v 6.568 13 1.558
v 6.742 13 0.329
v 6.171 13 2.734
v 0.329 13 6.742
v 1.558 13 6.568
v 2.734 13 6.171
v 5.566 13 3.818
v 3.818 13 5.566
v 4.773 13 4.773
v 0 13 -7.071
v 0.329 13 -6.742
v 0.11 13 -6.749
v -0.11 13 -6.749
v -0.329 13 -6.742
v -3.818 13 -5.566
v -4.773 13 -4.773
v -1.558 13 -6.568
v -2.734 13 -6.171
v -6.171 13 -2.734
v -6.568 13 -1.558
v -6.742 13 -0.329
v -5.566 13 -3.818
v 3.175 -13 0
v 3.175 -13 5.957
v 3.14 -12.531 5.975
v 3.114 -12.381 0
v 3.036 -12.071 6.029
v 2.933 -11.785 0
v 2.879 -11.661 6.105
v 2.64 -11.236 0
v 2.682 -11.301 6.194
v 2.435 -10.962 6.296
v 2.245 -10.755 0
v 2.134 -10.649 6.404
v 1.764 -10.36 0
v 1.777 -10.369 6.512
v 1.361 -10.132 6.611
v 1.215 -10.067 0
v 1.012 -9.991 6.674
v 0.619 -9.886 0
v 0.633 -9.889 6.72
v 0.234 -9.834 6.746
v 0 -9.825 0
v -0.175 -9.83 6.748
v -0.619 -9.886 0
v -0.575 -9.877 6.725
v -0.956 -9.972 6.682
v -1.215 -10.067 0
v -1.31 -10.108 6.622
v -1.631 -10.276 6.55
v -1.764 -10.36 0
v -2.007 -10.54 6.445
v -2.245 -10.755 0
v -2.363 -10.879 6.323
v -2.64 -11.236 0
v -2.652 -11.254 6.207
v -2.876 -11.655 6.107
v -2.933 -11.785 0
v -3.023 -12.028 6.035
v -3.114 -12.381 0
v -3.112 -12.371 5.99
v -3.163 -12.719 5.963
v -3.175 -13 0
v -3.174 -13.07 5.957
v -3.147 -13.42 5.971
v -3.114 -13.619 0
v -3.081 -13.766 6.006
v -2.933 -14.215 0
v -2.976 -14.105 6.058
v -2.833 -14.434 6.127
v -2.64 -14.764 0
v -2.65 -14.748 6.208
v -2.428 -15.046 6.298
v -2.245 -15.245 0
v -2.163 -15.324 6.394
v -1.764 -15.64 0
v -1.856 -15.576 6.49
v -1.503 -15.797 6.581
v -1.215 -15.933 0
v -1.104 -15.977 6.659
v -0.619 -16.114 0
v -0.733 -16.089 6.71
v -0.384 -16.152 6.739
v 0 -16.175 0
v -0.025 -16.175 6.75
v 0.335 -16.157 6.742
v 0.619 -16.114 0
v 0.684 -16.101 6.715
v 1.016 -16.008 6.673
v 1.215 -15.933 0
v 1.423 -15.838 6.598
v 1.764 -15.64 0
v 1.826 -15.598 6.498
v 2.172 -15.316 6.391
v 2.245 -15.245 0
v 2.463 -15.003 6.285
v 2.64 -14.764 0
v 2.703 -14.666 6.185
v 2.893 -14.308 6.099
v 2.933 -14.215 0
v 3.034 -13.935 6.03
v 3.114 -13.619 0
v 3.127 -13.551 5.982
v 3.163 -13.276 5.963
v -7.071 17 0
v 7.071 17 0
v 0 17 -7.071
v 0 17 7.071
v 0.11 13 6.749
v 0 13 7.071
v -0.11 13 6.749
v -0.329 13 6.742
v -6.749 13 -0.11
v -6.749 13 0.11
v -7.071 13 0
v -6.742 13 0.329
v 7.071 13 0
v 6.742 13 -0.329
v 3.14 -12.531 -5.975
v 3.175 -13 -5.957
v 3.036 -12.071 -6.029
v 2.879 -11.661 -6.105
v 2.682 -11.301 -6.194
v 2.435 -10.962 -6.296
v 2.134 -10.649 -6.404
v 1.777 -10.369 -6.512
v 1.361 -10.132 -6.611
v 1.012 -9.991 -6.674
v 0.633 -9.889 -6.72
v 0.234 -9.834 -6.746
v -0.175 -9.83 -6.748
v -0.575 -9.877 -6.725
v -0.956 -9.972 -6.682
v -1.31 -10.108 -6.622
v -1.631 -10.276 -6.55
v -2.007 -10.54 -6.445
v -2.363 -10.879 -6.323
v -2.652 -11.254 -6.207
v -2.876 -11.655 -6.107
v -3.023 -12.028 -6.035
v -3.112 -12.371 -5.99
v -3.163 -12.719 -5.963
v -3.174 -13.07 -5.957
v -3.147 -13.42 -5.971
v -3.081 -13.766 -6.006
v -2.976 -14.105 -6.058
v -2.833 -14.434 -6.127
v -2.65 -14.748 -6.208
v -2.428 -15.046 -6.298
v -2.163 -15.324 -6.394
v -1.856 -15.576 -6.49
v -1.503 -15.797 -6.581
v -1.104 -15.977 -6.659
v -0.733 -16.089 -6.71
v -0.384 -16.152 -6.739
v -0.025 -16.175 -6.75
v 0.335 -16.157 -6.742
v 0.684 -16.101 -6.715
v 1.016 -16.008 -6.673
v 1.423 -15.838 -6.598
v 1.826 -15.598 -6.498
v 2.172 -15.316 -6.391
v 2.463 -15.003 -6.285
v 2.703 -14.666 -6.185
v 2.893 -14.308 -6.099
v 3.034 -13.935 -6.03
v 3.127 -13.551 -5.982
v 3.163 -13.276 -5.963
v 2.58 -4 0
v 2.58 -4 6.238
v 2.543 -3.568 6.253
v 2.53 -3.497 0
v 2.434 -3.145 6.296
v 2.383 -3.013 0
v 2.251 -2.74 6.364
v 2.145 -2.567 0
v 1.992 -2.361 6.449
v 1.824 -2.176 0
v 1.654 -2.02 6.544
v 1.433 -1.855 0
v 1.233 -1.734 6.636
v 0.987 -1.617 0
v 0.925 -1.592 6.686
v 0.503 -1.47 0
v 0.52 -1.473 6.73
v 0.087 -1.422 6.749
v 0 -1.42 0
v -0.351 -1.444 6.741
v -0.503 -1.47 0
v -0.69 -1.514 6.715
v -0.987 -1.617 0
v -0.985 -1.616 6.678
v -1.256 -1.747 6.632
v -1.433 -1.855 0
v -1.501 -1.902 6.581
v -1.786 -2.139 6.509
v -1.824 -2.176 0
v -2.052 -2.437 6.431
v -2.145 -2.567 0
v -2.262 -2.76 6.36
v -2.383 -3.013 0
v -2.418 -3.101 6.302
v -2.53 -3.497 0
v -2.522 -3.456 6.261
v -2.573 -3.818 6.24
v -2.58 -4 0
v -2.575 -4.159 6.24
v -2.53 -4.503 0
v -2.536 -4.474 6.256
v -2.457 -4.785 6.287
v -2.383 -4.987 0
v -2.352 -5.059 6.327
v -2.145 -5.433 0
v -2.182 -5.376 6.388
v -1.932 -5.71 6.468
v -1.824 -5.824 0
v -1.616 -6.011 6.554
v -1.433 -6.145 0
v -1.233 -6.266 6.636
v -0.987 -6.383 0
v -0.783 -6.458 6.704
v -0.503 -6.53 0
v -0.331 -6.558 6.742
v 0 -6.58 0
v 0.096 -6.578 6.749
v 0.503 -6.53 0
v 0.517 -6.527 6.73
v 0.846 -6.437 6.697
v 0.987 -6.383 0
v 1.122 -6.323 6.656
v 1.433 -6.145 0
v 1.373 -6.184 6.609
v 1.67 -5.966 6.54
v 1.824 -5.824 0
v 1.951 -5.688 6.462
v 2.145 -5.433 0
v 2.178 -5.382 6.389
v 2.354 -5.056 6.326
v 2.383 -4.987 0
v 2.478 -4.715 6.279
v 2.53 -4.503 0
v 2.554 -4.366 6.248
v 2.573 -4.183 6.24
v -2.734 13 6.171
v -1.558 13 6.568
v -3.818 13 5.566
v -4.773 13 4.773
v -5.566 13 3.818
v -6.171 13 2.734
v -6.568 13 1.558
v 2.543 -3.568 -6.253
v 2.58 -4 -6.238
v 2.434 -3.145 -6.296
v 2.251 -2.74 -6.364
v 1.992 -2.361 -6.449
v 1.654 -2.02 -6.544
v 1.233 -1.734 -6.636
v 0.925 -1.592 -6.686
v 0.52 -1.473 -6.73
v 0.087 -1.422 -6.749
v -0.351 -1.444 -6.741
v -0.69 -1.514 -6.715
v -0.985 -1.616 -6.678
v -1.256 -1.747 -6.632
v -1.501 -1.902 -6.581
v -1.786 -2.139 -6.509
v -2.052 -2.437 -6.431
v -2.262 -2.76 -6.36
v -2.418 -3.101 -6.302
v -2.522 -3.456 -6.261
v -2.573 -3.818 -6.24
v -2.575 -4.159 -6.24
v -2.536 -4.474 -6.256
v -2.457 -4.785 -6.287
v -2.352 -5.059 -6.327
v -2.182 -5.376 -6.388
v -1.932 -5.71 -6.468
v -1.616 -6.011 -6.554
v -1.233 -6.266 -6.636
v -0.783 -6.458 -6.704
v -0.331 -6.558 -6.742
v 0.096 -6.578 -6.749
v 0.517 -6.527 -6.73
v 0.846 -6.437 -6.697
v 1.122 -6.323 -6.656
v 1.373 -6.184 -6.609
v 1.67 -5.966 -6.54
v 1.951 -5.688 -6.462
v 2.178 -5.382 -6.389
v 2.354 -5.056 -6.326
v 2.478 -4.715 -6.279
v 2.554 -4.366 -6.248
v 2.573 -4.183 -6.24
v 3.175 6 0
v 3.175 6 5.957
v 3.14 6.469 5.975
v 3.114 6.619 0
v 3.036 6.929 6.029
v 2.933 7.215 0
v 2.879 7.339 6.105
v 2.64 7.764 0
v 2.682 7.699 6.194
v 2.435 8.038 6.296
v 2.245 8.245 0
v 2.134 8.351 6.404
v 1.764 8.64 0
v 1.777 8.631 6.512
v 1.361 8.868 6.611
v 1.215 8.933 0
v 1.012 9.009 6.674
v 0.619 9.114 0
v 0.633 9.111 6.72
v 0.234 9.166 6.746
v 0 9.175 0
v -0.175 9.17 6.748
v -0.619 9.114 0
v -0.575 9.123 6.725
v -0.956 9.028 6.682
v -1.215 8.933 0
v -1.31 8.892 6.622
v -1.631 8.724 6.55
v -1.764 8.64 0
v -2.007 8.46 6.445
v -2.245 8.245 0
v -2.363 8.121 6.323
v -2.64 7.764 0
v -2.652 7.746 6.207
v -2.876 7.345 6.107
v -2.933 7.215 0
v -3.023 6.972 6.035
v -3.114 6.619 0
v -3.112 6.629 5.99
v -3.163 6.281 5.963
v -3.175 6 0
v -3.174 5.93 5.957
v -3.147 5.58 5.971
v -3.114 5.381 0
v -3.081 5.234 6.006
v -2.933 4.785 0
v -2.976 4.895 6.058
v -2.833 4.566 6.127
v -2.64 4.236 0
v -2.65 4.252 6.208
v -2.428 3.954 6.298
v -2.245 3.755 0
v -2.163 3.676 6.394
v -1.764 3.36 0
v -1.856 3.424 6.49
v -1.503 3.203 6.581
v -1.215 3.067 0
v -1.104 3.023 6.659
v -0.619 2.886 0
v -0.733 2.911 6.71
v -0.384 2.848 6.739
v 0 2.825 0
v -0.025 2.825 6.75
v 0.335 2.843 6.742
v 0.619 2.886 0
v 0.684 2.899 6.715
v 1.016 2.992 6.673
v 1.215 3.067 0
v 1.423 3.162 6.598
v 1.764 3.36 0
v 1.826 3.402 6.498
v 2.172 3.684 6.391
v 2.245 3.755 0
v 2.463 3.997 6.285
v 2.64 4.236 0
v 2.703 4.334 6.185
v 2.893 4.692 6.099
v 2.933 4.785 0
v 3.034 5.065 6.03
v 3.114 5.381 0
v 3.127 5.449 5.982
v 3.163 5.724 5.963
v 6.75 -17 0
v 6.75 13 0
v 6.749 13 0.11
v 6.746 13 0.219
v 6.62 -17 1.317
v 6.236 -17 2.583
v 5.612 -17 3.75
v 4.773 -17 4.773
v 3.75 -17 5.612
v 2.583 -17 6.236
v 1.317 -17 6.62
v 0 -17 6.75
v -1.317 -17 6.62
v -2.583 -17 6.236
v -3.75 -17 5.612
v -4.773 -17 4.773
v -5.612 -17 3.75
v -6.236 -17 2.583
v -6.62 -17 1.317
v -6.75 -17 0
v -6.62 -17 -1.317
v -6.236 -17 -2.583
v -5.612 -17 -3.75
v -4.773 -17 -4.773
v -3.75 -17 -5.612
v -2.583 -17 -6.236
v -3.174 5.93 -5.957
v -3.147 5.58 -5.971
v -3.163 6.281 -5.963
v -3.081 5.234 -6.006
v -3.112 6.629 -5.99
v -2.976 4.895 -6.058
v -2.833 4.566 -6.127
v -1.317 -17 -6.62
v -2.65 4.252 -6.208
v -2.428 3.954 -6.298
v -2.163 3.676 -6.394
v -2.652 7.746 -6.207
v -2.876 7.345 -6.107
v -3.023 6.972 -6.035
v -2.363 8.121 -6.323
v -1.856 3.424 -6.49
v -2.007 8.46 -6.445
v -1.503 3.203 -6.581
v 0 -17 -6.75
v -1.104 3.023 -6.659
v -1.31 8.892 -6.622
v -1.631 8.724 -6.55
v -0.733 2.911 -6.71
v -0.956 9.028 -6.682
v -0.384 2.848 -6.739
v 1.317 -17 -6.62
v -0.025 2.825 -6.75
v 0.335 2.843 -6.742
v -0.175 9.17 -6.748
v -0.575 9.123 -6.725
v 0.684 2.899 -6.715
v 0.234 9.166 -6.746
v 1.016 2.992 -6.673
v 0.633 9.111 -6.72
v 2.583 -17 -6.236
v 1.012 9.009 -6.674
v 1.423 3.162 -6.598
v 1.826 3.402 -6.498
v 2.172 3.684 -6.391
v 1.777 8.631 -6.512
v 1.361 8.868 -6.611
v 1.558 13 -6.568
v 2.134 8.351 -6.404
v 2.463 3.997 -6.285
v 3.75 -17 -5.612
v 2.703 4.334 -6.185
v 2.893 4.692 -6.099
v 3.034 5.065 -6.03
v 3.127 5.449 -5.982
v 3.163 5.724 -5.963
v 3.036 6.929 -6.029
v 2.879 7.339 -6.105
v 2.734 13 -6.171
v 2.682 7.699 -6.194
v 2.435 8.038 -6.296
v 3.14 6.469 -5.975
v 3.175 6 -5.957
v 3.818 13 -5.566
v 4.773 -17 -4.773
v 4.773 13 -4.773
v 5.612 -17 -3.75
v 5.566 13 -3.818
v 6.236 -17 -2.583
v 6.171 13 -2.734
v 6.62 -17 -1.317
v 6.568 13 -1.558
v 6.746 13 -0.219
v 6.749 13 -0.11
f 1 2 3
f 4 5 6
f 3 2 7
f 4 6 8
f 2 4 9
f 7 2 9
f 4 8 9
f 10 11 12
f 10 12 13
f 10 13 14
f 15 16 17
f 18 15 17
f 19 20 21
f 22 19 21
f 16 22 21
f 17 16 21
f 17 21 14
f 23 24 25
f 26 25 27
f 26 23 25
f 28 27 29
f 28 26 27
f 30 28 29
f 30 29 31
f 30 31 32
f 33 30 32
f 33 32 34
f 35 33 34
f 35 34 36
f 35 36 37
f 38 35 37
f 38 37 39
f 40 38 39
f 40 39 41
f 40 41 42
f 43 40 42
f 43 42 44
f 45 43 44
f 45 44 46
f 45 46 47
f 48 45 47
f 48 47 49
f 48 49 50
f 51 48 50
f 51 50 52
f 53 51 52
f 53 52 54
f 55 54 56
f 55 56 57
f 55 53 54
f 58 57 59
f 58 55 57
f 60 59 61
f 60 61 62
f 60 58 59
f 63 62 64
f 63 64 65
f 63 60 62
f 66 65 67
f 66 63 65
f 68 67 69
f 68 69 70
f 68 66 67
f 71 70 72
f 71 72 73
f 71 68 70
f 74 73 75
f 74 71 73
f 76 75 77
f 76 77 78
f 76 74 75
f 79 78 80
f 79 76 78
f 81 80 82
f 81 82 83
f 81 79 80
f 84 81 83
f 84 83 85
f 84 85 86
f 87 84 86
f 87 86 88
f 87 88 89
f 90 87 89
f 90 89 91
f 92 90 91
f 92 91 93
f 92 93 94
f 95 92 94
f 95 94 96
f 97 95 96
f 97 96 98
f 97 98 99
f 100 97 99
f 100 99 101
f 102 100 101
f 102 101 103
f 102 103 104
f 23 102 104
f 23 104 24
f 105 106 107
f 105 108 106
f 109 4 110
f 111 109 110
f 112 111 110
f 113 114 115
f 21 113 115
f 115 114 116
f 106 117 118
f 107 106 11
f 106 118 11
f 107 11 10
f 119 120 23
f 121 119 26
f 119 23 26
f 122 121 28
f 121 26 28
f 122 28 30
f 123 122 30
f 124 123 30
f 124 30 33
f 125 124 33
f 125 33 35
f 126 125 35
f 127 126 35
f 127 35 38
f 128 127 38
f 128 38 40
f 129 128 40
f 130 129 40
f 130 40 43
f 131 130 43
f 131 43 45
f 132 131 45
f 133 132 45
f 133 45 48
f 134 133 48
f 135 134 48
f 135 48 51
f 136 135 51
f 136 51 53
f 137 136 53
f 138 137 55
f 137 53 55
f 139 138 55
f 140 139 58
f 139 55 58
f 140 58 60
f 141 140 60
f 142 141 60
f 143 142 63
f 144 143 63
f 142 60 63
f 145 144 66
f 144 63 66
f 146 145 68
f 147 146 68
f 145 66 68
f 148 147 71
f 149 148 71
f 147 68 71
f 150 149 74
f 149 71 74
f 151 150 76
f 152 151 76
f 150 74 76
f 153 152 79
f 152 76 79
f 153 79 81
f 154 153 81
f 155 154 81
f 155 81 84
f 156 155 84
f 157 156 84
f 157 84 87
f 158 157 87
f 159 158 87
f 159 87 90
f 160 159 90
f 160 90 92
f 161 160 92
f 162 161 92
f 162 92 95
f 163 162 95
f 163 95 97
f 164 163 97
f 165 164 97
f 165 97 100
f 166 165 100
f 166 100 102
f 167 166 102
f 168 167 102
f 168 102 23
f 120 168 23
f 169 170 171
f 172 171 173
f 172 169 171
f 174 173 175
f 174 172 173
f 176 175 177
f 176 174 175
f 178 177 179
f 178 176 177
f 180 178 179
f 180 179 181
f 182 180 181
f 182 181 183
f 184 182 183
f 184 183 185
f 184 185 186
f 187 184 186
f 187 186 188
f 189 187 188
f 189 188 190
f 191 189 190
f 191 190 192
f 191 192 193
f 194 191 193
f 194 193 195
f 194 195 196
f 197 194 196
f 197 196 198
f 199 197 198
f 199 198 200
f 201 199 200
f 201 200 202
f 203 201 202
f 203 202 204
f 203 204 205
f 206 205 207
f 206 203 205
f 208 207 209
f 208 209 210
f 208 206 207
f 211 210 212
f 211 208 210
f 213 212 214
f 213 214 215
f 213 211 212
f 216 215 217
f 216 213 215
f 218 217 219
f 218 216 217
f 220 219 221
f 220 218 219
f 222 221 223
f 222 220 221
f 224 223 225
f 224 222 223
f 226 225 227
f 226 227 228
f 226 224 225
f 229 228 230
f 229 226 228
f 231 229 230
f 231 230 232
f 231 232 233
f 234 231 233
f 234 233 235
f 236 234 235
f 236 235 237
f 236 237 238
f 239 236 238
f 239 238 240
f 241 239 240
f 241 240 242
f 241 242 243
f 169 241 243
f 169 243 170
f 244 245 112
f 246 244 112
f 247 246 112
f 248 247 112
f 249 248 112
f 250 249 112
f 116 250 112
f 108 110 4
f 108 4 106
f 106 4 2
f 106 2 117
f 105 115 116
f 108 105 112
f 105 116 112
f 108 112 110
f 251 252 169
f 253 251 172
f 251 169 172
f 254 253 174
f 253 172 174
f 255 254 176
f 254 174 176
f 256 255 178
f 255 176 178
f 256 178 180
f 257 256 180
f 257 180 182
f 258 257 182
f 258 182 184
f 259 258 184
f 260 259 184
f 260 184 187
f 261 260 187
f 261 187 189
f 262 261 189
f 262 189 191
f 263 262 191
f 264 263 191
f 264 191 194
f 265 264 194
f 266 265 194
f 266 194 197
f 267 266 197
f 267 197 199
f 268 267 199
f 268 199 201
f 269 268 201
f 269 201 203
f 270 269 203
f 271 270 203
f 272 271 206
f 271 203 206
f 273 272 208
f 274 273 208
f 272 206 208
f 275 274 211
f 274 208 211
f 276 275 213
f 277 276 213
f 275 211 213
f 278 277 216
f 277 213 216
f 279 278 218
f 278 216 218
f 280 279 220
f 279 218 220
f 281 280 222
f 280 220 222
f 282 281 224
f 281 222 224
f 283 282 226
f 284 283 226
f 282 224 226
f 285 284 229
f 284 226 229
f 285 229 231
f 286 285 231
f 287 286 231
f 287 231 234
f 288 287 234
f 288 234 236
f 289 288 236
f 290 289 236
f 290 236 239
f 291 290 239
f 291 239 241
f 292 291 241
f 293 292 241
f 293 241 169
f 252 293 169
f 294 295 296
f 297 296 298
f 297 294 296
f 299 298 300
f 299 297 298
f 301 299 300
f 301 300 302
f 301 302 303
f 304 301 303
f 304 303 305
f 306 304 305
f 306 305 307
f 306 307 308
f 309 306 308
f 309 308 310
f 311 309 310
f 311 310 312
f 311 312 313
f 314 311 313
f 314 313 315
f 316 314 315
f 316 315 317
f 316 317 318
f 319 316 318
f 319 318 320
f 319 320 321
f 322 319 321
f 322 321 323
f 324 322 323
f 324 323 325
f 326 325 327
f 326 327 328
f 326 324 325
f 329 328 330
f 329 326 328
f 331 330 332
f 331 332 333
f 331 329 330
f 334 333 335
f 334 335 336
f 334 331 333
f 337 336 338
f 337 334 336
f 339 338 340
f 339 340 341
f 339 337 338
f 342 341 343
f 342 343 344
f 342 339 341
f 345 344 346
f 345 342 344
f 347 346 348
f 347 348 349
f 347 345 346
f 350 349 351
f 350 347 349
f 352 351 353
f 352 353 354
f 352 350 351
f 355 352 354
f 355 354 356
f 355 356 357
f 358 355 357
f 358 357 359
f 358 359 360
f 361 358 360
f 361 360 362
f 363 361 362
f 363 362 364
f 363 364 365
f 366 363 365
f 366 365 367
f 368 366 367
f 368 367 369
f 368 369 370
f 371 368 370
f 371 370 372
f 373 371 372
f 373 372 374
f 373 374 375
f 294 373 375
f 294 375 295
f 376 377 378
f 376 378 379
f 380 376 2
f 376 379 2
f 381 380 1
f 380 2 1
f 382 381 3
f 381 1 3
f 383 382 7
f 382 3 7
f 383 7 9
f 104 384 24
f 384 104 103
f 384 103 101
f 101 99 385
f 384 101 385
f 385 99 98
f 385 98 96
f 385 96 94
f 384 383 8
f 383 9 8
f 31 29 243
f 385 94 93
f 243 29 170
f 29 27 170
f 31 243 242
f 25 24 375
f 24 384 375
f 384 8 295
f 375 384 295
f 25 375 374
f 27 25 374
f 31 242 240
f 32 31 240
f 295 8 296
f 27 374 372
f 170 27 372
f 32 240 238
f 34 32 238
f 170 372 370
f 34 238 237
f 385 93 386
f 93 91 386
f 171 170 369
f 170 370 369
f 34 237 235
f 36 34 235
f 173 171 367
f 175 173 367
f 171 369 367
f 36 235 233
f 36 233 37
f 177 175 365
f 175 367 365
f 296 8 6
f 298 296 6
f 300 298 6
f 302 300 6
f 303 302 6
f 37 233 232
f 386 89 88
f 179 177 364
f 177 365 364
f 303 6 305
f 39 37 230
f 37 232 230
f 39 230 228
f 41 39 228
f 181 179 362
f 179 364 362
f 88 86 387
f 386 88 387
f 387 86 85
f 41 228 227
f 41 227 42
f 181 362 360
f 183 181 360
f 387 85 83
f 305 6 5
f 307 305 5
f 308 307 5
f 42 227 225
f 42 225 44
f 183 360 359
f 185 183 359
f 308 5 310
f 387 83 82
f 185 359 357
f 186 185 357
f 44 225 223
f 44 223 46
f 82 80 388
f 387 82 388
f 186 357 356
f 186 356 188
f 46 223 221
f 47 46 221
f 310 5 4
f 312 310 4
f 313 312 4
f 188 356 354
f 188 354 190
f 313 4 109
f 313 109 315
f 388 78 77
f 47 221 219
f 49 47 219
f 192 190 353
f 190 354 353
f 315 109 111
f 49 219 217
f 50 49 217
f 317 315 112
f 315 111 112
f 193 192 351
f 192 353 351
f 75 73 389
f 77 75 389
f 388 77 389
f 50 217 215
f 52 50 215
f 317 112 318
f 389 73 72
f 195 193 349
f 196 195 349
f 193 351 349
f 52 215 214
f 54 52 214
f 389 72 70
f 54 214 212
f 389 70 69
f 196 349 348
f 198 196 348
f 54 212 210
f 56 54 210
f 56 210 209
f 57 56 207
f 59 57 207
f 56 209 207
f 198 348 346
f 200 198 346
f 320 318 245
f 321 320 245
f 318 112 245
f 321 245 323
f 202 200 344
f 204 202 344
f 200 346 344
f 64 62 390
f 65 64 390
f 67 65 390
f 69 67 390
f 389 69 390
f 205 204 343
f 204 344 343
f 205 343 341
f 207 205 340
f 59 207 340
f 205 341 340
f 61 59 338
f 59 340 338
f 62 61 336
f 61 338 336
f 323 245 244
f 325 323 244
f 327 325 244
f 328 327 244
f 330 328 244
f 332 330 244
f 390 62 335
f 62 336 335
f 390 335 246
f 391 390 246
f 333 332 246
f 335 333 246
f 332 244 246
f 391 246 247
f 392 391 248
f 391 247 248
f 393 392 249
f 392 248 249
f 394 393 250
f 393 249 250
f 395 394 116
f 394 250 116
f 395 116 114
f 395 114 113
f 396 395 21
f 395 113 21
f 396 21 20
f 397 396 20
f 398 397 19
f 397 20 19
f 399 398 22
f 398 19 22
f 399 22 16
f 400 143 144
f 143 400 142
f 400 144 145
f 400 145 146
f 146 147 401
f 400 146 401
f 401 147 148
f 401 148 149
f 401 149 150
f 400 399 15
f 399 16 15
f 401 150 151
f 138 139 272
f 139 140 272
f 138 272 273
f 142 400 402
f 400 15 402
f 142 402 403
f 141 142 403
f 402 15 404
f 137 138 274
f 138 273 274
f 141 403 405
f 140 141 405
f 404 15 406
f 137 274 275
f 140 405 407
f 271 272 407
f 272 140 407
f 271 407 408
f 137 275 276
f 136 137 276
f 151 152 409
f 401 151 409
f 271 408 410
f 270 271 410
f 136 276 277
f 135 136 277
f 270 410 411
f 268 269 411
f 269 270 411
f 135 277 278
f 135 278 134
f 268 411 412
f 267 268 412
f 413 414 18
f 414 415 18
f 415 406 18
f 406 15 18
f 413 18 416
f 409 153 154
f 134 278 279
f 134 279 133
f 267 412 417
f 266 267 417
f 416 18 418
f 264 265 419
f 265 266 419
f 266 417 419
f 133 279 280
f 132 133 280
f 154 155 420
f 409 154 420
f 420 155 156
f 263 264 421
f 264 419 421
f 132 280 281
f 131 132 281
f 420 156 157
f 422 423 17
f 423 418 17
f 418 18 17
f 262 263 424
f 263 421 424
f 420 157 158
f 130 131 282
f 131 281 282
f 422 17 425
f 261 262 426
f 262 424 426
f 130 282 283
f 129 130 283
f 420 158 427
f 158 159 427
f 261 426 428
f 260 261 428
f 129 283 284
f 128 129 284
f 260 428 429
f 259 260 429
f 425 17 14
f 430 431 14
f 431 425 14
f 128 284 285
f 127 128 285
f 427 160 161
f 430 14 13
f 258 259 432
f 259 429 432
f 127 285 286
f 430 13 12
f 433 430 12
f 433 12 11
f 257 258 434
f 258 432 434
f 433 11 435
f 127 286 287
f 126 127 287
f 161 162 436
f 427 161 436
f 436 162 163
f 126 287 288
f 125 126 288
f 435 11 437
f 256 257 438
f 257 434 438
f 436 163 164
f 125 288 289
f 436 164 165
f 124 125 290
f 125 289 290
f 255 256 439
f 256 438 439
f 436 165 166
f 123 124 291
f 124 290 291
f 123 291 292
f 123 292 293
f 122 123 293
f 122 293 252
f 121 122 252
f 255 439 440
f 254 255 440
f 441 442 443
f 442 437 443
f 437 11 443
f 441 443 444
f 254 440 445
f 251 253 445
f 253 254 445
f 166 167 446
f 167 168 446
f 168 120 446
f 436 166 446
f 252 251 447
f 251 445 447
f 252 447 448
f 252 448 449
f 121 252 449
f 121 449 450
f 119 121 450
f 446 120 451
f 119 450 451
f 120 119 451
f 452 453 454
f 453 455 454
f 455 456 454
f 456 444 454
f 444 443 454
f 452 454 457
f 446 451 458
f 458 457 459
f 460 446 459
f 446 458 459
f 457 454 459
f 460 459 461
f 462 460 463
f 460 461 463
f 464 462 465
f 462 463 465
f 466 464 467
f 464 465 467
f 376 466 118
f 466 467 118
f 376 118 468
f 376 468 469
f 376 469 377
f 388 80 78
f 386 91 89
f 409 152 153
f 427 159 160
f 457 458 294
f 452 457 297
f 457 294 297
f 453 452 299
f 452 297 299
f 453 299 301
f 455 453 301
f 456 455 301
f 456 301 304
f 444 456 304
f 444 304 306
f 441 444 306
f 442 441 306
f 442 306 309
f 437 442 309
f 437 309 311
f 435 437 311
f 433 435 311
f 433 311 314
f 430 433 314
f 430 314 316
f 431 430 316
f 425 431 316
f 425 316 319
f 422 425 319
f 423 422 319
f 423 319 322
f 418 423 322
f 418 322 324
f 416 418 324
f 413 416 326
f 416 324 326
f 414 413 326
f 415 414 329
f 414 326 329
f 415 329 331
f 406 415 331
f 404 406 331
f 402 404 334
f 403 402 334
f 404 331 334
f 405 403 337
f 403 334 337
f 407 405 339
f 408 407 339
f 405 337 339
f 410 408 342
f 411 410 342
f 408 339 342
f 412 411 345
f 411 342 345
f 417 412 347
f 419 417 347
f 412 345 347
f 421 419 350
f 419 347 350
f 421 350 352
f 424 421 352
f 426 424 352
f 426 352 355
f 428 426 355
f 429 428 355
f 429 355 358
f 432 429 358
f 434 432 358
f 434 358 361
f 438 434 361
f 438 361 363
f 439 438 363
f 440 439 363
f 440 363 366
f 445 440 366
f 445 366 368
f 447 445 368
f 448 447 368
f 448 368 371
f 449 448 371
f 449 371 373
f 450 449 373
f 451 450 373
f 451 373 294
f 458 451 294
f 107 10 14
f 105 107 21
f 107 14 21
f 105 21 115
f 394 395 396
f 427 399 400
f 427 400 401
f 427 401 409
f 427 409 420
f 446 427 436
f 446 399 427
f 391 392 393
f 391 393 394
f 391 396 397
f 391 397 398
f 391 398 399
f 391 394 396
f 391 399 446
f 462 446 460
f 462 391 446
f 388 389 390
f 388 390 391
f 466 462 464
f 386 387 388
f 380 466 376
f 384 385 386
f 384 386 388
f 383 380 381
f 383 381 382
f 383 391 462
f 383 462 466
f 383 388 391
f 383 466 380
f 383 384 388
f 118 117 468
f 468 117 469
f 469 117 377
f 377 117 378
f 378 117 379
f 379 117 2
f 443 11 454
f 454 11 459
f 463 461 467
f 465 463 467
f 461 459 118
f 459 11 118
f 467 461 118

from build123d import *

# Parameters (mm, degrees)
F0_R          = 6.75
F1_DEPTH      = 13
F1_DEPTH_BACK = 17
F2_R          = 3.175
F2_R_2        = 2.5796875
F3_DEPTH      = 6.751
F3_DEPTH_BACK = 6.751
F5_DEPTH      = 4


with BuildPart() as f1:
    # F0 (on Front) → F1 (new body, two sides)
    with BuildSketch(Plane.XZ) as f1_sk:
        Circle(F0_R)
    extrude(amount=-F1_DEPTH)
    extrude(f1_sk.sketch, amount=F1_DEPTH_BACK)

    # F2 (on Top) → F3 (cut, two sides)
    with BuildSketch(Plane.XY) as f3_sk:
        with Locations((0, 6)):
            Circle(F2_R)
        with Locations((0, -4)):
            Circle(F2_R_2)
        with Locations((0, -13)):
            Circle(F2_R)
    extrude(amount=-F3_DEPTH, mode=Mode.SUBTRACT)
    extrude(f3_sk.sketch, amount=F3_DEPTH_BACK, mode=Mode.SUBTRACT)

    # F4 (on face) → F5 (join)
    with BuildSketch(Plane(origin=(0, 13, 0), x_dir=(-1, 0, 0), z_dir=(0, 1, 0))):
        Polygon((-7.0710678119, 0), (0, -7.0710678119), (7.0710678119, 0), (0, 7.0710678119), align=None)
    extrude(amount=F5_DEPTH)


solid = f1.part
